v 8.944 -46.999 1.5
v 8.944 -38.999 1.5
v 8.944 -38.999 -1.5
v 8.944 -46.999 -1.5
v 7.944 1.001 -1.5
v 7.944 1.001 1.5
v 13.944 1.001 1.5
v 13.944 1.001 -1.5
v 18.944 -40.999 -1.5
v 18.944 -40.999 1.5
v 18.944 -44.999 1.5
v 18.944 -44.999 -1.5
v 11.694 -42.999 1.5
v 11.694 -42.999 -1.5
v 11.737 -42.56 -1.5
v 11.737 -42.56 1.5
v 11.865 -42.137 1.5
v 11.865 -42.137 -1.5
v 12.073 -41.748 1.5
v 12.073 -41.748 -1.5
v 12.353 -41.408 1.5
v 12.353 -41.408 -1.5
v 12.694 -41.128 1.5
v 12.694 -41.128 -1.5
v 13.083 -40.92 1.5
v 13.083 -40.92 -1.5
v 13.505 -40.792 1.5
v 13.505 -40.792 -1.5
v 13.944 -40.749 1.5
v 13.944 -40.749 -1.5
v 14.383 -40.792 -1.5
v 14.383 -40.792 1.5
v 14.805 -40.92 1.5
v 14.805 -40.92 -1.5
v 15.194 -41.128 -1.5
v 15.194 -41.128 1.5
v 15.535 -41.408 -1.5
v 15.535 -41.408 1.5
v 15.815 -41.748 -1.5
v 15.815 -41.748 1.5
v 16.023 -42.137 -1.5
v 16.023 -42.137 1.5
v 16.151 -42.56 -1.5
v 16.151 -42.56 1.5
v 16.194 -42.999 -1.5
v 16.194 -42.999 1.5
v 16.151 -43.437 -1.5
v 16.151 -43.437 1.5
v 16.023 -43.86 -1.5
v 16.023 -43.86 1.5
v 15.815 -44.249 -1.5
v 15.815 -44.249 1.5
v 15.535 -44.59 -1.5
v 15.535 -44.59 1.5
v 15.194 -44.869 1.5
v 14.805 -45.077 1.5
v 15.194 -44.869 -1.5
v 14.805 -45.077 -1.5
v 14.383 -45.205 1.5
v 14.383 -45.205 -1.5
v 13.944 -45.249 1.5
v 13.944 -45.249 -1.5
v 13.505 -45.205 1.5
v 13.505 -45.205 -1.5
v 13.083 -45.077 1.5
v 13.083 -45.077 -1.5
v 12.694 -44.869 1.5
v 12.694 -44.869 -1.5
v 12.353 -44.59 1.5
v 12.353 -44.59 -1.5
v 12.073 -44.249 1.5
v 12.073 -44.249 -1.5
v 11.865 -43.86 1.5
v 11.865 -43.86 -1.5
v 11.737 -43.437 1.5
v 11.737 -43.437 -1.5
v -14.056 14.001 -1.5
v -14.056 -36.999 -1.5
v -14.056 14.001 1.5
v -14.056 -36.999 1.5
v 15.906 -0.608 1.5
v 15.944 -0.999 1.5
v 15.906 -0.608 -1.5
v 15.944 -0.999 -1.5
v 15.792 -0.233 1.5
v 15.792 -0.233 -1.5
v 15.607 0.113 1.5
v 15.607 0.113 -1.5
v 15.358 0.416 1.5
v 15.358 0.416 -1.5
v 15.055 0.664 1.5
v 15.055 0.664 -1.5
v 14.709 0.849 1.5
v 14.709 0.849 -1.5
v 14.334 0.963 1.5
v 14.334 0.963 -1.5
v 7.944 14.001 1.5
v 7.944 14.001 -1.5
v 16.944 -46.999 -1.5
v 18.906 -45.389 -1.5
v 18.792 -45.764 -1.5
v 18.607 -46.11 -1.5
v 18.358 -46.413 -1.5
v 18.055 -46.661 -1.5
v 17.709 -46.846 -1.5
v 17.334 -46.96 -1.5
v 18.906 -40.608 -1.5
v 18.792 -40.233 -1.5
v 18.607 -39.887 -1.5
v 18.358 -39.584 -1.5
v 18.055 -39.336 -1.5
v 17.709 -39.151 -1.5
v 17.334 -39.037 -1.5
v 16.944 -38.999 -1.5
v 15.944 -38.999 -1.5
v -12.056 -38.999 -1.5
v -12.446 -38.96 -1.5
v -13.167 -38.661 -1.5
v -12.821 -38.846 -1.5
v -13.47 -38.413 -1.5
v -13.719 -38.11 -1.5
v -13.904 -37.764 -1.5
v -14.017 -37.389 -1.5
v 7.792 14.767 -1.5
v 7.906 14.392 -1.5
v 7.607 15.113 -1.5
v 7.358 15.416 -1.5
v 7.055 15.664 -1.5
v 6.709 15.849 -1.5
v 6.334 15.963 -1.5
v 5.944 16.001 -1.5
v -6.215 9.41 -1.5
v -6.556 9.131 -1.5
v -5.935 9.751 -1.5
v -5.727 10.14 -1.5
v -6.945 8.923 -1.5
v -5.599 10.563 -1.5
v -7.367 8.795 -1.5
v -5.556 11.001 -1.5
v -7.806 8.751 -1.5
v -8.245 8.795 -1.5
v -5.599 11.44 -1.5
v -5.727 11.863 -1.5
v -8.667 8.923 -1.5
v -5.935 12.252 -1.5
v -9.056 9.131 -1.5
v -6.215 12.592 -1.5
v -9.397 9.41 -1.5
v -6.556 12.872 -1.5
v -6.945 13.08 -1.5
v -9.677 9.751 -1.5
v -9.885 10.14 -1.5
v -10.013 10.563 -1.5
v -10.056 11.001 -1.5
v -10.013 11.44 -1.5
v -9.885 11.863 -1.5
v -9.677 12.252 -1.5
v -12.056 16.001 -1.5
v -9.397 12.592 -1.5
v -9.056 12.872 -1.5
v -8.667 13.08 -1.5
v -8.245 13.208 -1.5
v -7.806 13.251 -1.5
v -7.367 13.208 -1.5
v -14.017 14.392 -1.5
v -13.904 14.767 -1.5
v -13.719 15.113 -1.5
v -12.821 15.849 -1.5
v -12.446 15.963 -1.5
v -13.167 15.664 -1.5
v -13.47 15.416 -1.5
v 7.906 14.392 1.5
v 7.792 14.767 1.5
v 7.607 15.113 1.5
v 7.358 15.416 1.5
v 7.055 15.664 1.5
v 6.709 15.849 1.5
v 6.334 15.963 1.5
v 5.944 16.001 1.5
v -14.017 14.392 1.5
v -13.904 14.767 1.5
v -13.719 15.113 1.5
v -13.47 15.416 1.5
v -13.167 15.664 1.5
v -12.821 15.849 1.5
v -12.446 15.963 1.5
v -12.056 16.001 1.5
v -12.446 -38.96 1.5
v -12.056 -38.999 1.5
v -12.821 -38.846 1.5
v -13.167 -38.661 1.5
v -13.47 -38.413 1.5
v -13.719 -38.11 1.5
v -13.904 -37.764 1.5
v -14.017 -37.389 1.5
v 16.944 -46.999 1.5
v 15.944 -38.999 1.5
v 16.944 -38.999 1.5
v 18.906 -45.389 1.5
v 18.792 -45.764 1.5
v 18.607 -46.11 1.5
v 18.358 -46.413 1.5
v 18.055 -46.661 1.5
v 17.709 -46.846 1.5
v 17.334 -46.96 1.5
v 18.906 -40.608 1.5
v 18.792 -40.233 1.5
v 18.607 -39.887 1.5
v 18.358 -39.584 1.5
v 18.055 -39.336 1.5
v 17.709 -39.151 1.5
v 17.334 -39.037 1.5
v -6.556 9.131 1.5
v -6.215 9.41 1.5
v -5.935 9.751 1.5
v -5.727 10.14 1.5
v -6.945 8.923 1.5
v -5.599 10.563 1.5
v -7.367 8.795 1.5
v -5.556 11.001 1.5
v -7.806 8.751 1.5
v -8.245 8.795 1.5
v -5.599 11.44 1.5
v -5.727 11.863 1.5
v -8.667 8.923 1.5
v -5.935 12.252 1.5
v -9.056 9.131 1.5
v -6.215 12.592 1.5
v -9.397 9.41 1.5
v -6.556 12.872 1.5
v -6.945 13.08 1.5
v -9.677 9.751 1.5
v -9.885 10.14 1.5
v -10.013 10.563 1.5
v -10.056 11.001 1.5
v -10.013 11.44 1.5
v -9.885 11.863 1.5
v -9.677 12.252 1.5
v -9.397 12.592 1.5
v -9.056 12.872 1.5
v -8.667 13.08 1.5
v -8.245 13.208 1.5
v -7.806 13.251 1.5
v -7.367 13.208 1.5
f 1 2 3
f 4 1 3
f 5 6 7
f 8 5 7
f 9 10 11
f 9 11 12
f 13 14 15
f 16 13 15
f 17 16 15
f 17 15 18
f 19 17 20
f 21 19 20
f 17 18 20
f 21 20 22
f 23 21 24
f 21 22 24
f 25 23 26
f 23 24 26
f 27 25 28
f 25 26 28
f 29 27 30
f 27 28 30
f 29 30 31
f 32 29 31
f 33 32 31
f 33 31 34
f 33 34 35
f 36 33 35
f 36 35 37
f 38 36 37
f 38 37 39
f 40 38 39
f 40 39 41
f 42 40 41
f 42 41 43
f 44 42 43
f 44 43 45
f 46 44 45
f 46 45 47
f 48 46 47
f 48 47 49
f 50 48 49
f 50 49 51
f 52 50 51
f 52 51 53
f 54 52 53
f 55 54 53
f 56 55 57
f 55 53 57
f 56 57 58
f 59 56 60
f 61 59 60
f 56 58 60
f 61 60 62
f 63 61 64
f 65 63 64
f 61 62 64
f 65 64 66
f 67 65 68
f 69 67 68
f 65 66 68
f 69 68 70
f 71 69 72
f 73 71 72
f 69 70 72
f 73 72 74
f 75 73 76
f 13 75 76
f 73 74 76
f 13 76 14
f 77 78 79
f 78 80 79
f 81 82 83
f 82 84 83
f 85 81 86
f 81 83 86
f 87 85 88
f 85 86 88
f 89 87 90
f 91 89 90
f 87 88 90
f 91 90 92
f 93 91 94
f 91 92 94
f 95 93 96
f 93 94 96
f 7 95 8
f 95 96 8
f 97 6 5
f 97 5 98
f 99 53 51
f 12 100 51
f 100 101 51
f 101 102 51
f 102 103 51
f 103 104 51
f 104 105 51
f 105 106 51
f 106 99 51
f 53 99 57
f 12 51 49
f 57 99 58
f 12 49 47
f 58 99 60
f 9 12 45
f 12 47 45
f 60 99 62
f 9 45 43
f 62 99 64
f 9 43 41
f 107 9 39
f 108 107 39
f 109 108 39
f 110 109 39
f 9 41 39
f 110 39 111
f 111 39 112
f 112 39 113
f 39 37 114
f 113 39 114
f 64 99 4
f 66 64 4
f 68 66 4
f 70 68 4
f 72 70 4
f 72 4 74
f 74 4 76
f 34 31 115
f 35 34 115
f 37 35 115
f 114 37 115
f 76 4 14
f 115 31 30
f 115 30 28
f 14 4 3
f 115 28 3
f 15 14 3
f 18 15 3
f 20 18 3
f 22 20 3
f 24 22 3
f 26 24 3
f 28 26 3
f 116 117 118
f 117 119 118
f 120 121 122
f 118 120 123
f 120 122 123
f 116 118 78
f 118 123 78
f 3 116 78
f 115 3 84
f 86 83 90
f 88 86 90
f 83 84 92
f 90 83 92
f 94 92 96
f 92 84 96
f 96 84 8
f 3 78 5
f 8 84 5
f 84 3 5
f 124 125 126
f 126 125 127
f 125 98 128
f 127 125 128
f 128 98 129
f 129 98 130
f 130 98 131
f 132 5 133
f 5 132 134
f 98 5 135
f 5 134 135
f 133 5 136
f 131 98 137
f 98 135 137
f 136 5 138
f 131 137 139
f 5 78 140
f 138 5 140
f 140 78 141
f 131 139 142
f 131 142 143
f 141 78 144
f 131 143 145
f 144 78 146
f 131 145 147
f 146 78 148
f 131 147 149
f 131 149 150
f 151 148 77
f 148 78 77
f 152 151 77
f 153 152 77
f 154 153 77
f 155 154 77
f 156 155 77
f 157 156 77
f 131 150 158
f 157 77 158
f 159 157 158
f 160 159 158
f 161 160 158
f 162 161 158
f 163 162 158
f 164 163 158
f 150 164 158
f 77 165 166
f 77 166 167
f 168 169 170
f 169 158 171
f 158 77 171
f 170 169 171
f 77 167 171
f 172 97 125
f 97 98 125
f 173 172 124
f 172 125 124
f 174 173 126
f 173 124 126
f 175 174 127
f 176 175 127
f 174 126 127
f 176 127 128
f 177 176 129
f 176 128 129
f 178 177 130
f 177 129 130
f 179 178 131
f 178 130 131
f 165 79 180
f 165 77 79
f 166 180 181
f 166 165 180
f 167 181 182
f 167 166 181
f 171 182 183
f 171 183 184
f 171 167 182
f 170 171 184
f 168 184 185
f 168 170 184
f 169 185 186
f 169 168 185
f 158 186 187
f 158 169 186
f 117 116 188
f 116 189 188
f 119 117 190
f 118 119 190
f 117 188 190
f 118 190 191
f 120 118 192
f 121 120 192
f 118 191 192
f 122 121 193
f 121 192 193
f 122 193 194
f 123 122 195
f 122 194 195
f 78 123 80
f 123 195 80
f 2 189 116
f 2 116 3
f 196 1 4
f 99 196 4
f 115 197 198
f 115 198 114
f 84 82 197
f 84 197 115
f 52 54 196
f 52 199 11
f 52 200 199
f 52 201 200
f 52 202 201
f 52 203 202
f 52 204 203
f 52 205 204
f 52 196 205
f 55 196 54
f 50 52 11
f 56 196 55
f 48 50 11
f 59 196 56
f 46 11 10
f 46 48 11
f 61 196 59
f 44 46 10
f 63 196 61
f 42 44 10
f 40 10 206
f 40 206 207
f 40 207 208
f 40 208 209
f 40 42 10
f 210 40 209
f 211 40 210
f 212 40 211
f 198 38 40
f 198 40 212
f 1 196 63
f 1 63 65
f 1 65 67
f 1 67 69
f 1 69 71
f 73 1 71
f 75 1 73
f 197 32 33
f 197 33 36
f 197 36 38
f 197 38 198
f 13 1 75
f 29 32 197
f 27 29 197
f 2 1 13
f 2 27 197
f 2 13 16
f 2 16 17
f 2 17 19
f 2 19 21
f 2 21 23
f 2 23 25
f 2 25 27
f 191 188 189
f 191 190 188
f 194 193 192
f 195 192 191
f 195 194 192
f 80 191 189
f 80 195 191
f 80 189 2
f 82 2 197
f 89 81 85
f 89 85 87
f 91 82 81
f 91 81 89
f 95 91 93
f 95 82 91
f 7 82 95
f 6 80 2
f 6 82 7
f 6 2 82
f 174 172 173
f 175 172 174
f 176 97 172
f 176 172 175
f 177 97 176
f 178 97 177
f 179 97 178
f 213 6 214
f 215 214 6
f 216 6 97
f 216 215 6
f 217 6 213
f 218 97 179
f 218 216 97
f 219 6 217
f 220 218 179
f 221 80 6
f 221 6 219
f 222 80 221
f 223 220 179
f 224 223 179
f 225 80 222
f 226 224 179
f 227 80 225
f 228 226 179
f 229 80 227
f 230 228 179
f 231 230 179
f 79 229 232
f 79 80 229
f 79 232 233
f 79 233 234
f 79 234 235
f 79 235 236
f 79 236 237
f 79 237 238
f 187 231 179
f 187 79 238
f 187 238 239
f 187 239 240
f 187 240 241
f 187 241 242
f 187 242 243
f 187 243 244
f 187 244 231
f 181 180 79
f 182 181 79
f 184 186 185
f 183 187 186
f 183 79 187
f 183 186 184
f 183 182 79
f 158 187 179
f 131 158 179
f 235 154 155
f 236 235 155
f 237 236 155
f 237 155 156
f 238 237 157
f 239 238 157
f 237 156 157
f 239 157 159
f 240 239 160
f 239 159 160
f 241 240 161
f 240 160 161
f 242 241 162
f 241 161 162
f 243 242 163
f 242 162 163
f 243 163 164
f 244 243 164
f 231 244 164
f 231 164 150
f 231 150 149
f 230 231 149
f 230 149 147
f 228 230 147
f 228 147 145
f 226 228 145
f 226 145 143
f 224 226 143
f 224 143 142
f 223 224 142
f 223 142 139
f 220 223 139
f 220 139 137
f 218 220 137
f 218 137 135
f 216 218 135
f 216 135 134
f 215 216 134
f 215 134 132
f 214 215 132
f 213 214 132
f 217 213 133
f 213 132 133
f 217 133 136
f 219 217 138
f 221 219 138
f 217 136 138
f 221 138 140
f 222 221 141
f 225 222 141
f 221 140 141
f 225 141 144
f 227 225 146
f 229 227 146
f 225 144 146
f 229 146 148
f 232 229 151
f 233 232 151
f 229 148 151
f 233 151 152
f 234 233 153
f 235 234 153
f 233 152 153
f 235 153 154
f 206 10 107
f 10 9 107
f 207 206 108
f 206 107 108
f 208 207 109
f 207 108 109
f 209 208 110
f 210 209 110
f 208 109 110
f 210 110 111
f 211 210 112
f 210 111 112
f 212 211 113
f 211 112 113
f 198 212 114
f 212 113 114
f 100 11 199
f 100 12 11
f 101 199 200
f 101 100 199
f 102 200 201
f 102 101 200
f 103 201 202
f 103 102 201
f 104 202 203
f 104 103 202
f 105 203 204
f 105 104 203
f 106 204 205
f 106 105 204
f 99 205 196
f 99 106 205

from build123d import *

# Parameters (mm, degrees)
SKETCH1_W            = 30
SKETCH1_H            = 55
BOSS_EXTRUDE1_DEPTH  = 1.5
SKETCH2_W            = 8
SKETCH2_H            = 15
CUT_EXTRUDE1_DEPTH   = 43.238610108
SKETCH3_W            = 7
SKETCH3_H            = 3
BOSS_EXTRUDE2_DEPTH  = 8
SKETCH6_W            = 3
SKETCH6_H            = 8
BOSS_EXTRUDE3_DEPTH  = 3
M4_CLEARANCE_HOLE1_D = 4.5
FILLET1_R            = 2


with BuildPart() as part:
    # Sketch1 → Boss-Extrude1 (new, symmetric)
    with BuildSketch(Plane.XY):
        with Locations((0.944117647, -11.498529412)):
            Rectangle(SKETCH1_W, SKETCH1_H)
    extrude(amount=BOSS_EXTRUDE1_DEPTH, both=True)

    # Sketch2 → Cut-Extrude1 (cut, through all)
    with BuildSketch(Plane.XY.offset(1.5)):
        with Locations((11.944117647, 8.501470588)):
            Rectangle(SKETCH2_W, SKETCH2_H)
    extrude(amount=-CUT_EXTRUDE1_DEPTH, mode=Mode.SUBTRACT)

    # Sketch3 → Boss-Extrude2 (add)
    with BuildSketch(Plane(origin=(0, -38.998529412, 0), x_dir=(-1, 0, 0), z_dir=(0, -1, 0))):
        with Locations((-12.444117647, 0)):
            Rectangle(SKETCH3_W, SKETCH3_H)
    extrude(amount=BOSS_EXTRUDE2_DEPTH)

    # Sketch6 → Boss-Extrude3 (add)
    with BuildSketch(Plane(origin=(15.944117647, 0, 0), x_dir=(0, 0, -1), z_dir=(1, 0, 0))):
        with Locations((0, -42.998529412)):
            Rectangle(SKETCH6_W, SKETCH6_H)
    extrude(amount=BOSS_EXTRUDE3_DEPTH)

    # M4 Clearance Hole1 (through all)
    with Locations(Plane.XY.offset(1.5)):
        with Locations((-7.805882353, 11.001470588), (13.944117647, -42.998529412)):
            Hole(M4_CLEARANCE_HOLE1_D / 2)

    # Fillet1
    fillet1_edges = [part.edges().sort_by_distance(p)[0] for p in [
        (7.944117647, 16.001470588, 0),
        (15.944117647, 1.001470588, 0),
        (18.944117647, -46.998529412, 0),
        (18.944117647, -38.998529412, 0),
        (-14.055882353, 16.001470588, 0),
        (-14.055882353, -38.998529412, 0),
    ]]
    fillet(fillet1_edges, radius=FILLET1_R)


solid = part.part
